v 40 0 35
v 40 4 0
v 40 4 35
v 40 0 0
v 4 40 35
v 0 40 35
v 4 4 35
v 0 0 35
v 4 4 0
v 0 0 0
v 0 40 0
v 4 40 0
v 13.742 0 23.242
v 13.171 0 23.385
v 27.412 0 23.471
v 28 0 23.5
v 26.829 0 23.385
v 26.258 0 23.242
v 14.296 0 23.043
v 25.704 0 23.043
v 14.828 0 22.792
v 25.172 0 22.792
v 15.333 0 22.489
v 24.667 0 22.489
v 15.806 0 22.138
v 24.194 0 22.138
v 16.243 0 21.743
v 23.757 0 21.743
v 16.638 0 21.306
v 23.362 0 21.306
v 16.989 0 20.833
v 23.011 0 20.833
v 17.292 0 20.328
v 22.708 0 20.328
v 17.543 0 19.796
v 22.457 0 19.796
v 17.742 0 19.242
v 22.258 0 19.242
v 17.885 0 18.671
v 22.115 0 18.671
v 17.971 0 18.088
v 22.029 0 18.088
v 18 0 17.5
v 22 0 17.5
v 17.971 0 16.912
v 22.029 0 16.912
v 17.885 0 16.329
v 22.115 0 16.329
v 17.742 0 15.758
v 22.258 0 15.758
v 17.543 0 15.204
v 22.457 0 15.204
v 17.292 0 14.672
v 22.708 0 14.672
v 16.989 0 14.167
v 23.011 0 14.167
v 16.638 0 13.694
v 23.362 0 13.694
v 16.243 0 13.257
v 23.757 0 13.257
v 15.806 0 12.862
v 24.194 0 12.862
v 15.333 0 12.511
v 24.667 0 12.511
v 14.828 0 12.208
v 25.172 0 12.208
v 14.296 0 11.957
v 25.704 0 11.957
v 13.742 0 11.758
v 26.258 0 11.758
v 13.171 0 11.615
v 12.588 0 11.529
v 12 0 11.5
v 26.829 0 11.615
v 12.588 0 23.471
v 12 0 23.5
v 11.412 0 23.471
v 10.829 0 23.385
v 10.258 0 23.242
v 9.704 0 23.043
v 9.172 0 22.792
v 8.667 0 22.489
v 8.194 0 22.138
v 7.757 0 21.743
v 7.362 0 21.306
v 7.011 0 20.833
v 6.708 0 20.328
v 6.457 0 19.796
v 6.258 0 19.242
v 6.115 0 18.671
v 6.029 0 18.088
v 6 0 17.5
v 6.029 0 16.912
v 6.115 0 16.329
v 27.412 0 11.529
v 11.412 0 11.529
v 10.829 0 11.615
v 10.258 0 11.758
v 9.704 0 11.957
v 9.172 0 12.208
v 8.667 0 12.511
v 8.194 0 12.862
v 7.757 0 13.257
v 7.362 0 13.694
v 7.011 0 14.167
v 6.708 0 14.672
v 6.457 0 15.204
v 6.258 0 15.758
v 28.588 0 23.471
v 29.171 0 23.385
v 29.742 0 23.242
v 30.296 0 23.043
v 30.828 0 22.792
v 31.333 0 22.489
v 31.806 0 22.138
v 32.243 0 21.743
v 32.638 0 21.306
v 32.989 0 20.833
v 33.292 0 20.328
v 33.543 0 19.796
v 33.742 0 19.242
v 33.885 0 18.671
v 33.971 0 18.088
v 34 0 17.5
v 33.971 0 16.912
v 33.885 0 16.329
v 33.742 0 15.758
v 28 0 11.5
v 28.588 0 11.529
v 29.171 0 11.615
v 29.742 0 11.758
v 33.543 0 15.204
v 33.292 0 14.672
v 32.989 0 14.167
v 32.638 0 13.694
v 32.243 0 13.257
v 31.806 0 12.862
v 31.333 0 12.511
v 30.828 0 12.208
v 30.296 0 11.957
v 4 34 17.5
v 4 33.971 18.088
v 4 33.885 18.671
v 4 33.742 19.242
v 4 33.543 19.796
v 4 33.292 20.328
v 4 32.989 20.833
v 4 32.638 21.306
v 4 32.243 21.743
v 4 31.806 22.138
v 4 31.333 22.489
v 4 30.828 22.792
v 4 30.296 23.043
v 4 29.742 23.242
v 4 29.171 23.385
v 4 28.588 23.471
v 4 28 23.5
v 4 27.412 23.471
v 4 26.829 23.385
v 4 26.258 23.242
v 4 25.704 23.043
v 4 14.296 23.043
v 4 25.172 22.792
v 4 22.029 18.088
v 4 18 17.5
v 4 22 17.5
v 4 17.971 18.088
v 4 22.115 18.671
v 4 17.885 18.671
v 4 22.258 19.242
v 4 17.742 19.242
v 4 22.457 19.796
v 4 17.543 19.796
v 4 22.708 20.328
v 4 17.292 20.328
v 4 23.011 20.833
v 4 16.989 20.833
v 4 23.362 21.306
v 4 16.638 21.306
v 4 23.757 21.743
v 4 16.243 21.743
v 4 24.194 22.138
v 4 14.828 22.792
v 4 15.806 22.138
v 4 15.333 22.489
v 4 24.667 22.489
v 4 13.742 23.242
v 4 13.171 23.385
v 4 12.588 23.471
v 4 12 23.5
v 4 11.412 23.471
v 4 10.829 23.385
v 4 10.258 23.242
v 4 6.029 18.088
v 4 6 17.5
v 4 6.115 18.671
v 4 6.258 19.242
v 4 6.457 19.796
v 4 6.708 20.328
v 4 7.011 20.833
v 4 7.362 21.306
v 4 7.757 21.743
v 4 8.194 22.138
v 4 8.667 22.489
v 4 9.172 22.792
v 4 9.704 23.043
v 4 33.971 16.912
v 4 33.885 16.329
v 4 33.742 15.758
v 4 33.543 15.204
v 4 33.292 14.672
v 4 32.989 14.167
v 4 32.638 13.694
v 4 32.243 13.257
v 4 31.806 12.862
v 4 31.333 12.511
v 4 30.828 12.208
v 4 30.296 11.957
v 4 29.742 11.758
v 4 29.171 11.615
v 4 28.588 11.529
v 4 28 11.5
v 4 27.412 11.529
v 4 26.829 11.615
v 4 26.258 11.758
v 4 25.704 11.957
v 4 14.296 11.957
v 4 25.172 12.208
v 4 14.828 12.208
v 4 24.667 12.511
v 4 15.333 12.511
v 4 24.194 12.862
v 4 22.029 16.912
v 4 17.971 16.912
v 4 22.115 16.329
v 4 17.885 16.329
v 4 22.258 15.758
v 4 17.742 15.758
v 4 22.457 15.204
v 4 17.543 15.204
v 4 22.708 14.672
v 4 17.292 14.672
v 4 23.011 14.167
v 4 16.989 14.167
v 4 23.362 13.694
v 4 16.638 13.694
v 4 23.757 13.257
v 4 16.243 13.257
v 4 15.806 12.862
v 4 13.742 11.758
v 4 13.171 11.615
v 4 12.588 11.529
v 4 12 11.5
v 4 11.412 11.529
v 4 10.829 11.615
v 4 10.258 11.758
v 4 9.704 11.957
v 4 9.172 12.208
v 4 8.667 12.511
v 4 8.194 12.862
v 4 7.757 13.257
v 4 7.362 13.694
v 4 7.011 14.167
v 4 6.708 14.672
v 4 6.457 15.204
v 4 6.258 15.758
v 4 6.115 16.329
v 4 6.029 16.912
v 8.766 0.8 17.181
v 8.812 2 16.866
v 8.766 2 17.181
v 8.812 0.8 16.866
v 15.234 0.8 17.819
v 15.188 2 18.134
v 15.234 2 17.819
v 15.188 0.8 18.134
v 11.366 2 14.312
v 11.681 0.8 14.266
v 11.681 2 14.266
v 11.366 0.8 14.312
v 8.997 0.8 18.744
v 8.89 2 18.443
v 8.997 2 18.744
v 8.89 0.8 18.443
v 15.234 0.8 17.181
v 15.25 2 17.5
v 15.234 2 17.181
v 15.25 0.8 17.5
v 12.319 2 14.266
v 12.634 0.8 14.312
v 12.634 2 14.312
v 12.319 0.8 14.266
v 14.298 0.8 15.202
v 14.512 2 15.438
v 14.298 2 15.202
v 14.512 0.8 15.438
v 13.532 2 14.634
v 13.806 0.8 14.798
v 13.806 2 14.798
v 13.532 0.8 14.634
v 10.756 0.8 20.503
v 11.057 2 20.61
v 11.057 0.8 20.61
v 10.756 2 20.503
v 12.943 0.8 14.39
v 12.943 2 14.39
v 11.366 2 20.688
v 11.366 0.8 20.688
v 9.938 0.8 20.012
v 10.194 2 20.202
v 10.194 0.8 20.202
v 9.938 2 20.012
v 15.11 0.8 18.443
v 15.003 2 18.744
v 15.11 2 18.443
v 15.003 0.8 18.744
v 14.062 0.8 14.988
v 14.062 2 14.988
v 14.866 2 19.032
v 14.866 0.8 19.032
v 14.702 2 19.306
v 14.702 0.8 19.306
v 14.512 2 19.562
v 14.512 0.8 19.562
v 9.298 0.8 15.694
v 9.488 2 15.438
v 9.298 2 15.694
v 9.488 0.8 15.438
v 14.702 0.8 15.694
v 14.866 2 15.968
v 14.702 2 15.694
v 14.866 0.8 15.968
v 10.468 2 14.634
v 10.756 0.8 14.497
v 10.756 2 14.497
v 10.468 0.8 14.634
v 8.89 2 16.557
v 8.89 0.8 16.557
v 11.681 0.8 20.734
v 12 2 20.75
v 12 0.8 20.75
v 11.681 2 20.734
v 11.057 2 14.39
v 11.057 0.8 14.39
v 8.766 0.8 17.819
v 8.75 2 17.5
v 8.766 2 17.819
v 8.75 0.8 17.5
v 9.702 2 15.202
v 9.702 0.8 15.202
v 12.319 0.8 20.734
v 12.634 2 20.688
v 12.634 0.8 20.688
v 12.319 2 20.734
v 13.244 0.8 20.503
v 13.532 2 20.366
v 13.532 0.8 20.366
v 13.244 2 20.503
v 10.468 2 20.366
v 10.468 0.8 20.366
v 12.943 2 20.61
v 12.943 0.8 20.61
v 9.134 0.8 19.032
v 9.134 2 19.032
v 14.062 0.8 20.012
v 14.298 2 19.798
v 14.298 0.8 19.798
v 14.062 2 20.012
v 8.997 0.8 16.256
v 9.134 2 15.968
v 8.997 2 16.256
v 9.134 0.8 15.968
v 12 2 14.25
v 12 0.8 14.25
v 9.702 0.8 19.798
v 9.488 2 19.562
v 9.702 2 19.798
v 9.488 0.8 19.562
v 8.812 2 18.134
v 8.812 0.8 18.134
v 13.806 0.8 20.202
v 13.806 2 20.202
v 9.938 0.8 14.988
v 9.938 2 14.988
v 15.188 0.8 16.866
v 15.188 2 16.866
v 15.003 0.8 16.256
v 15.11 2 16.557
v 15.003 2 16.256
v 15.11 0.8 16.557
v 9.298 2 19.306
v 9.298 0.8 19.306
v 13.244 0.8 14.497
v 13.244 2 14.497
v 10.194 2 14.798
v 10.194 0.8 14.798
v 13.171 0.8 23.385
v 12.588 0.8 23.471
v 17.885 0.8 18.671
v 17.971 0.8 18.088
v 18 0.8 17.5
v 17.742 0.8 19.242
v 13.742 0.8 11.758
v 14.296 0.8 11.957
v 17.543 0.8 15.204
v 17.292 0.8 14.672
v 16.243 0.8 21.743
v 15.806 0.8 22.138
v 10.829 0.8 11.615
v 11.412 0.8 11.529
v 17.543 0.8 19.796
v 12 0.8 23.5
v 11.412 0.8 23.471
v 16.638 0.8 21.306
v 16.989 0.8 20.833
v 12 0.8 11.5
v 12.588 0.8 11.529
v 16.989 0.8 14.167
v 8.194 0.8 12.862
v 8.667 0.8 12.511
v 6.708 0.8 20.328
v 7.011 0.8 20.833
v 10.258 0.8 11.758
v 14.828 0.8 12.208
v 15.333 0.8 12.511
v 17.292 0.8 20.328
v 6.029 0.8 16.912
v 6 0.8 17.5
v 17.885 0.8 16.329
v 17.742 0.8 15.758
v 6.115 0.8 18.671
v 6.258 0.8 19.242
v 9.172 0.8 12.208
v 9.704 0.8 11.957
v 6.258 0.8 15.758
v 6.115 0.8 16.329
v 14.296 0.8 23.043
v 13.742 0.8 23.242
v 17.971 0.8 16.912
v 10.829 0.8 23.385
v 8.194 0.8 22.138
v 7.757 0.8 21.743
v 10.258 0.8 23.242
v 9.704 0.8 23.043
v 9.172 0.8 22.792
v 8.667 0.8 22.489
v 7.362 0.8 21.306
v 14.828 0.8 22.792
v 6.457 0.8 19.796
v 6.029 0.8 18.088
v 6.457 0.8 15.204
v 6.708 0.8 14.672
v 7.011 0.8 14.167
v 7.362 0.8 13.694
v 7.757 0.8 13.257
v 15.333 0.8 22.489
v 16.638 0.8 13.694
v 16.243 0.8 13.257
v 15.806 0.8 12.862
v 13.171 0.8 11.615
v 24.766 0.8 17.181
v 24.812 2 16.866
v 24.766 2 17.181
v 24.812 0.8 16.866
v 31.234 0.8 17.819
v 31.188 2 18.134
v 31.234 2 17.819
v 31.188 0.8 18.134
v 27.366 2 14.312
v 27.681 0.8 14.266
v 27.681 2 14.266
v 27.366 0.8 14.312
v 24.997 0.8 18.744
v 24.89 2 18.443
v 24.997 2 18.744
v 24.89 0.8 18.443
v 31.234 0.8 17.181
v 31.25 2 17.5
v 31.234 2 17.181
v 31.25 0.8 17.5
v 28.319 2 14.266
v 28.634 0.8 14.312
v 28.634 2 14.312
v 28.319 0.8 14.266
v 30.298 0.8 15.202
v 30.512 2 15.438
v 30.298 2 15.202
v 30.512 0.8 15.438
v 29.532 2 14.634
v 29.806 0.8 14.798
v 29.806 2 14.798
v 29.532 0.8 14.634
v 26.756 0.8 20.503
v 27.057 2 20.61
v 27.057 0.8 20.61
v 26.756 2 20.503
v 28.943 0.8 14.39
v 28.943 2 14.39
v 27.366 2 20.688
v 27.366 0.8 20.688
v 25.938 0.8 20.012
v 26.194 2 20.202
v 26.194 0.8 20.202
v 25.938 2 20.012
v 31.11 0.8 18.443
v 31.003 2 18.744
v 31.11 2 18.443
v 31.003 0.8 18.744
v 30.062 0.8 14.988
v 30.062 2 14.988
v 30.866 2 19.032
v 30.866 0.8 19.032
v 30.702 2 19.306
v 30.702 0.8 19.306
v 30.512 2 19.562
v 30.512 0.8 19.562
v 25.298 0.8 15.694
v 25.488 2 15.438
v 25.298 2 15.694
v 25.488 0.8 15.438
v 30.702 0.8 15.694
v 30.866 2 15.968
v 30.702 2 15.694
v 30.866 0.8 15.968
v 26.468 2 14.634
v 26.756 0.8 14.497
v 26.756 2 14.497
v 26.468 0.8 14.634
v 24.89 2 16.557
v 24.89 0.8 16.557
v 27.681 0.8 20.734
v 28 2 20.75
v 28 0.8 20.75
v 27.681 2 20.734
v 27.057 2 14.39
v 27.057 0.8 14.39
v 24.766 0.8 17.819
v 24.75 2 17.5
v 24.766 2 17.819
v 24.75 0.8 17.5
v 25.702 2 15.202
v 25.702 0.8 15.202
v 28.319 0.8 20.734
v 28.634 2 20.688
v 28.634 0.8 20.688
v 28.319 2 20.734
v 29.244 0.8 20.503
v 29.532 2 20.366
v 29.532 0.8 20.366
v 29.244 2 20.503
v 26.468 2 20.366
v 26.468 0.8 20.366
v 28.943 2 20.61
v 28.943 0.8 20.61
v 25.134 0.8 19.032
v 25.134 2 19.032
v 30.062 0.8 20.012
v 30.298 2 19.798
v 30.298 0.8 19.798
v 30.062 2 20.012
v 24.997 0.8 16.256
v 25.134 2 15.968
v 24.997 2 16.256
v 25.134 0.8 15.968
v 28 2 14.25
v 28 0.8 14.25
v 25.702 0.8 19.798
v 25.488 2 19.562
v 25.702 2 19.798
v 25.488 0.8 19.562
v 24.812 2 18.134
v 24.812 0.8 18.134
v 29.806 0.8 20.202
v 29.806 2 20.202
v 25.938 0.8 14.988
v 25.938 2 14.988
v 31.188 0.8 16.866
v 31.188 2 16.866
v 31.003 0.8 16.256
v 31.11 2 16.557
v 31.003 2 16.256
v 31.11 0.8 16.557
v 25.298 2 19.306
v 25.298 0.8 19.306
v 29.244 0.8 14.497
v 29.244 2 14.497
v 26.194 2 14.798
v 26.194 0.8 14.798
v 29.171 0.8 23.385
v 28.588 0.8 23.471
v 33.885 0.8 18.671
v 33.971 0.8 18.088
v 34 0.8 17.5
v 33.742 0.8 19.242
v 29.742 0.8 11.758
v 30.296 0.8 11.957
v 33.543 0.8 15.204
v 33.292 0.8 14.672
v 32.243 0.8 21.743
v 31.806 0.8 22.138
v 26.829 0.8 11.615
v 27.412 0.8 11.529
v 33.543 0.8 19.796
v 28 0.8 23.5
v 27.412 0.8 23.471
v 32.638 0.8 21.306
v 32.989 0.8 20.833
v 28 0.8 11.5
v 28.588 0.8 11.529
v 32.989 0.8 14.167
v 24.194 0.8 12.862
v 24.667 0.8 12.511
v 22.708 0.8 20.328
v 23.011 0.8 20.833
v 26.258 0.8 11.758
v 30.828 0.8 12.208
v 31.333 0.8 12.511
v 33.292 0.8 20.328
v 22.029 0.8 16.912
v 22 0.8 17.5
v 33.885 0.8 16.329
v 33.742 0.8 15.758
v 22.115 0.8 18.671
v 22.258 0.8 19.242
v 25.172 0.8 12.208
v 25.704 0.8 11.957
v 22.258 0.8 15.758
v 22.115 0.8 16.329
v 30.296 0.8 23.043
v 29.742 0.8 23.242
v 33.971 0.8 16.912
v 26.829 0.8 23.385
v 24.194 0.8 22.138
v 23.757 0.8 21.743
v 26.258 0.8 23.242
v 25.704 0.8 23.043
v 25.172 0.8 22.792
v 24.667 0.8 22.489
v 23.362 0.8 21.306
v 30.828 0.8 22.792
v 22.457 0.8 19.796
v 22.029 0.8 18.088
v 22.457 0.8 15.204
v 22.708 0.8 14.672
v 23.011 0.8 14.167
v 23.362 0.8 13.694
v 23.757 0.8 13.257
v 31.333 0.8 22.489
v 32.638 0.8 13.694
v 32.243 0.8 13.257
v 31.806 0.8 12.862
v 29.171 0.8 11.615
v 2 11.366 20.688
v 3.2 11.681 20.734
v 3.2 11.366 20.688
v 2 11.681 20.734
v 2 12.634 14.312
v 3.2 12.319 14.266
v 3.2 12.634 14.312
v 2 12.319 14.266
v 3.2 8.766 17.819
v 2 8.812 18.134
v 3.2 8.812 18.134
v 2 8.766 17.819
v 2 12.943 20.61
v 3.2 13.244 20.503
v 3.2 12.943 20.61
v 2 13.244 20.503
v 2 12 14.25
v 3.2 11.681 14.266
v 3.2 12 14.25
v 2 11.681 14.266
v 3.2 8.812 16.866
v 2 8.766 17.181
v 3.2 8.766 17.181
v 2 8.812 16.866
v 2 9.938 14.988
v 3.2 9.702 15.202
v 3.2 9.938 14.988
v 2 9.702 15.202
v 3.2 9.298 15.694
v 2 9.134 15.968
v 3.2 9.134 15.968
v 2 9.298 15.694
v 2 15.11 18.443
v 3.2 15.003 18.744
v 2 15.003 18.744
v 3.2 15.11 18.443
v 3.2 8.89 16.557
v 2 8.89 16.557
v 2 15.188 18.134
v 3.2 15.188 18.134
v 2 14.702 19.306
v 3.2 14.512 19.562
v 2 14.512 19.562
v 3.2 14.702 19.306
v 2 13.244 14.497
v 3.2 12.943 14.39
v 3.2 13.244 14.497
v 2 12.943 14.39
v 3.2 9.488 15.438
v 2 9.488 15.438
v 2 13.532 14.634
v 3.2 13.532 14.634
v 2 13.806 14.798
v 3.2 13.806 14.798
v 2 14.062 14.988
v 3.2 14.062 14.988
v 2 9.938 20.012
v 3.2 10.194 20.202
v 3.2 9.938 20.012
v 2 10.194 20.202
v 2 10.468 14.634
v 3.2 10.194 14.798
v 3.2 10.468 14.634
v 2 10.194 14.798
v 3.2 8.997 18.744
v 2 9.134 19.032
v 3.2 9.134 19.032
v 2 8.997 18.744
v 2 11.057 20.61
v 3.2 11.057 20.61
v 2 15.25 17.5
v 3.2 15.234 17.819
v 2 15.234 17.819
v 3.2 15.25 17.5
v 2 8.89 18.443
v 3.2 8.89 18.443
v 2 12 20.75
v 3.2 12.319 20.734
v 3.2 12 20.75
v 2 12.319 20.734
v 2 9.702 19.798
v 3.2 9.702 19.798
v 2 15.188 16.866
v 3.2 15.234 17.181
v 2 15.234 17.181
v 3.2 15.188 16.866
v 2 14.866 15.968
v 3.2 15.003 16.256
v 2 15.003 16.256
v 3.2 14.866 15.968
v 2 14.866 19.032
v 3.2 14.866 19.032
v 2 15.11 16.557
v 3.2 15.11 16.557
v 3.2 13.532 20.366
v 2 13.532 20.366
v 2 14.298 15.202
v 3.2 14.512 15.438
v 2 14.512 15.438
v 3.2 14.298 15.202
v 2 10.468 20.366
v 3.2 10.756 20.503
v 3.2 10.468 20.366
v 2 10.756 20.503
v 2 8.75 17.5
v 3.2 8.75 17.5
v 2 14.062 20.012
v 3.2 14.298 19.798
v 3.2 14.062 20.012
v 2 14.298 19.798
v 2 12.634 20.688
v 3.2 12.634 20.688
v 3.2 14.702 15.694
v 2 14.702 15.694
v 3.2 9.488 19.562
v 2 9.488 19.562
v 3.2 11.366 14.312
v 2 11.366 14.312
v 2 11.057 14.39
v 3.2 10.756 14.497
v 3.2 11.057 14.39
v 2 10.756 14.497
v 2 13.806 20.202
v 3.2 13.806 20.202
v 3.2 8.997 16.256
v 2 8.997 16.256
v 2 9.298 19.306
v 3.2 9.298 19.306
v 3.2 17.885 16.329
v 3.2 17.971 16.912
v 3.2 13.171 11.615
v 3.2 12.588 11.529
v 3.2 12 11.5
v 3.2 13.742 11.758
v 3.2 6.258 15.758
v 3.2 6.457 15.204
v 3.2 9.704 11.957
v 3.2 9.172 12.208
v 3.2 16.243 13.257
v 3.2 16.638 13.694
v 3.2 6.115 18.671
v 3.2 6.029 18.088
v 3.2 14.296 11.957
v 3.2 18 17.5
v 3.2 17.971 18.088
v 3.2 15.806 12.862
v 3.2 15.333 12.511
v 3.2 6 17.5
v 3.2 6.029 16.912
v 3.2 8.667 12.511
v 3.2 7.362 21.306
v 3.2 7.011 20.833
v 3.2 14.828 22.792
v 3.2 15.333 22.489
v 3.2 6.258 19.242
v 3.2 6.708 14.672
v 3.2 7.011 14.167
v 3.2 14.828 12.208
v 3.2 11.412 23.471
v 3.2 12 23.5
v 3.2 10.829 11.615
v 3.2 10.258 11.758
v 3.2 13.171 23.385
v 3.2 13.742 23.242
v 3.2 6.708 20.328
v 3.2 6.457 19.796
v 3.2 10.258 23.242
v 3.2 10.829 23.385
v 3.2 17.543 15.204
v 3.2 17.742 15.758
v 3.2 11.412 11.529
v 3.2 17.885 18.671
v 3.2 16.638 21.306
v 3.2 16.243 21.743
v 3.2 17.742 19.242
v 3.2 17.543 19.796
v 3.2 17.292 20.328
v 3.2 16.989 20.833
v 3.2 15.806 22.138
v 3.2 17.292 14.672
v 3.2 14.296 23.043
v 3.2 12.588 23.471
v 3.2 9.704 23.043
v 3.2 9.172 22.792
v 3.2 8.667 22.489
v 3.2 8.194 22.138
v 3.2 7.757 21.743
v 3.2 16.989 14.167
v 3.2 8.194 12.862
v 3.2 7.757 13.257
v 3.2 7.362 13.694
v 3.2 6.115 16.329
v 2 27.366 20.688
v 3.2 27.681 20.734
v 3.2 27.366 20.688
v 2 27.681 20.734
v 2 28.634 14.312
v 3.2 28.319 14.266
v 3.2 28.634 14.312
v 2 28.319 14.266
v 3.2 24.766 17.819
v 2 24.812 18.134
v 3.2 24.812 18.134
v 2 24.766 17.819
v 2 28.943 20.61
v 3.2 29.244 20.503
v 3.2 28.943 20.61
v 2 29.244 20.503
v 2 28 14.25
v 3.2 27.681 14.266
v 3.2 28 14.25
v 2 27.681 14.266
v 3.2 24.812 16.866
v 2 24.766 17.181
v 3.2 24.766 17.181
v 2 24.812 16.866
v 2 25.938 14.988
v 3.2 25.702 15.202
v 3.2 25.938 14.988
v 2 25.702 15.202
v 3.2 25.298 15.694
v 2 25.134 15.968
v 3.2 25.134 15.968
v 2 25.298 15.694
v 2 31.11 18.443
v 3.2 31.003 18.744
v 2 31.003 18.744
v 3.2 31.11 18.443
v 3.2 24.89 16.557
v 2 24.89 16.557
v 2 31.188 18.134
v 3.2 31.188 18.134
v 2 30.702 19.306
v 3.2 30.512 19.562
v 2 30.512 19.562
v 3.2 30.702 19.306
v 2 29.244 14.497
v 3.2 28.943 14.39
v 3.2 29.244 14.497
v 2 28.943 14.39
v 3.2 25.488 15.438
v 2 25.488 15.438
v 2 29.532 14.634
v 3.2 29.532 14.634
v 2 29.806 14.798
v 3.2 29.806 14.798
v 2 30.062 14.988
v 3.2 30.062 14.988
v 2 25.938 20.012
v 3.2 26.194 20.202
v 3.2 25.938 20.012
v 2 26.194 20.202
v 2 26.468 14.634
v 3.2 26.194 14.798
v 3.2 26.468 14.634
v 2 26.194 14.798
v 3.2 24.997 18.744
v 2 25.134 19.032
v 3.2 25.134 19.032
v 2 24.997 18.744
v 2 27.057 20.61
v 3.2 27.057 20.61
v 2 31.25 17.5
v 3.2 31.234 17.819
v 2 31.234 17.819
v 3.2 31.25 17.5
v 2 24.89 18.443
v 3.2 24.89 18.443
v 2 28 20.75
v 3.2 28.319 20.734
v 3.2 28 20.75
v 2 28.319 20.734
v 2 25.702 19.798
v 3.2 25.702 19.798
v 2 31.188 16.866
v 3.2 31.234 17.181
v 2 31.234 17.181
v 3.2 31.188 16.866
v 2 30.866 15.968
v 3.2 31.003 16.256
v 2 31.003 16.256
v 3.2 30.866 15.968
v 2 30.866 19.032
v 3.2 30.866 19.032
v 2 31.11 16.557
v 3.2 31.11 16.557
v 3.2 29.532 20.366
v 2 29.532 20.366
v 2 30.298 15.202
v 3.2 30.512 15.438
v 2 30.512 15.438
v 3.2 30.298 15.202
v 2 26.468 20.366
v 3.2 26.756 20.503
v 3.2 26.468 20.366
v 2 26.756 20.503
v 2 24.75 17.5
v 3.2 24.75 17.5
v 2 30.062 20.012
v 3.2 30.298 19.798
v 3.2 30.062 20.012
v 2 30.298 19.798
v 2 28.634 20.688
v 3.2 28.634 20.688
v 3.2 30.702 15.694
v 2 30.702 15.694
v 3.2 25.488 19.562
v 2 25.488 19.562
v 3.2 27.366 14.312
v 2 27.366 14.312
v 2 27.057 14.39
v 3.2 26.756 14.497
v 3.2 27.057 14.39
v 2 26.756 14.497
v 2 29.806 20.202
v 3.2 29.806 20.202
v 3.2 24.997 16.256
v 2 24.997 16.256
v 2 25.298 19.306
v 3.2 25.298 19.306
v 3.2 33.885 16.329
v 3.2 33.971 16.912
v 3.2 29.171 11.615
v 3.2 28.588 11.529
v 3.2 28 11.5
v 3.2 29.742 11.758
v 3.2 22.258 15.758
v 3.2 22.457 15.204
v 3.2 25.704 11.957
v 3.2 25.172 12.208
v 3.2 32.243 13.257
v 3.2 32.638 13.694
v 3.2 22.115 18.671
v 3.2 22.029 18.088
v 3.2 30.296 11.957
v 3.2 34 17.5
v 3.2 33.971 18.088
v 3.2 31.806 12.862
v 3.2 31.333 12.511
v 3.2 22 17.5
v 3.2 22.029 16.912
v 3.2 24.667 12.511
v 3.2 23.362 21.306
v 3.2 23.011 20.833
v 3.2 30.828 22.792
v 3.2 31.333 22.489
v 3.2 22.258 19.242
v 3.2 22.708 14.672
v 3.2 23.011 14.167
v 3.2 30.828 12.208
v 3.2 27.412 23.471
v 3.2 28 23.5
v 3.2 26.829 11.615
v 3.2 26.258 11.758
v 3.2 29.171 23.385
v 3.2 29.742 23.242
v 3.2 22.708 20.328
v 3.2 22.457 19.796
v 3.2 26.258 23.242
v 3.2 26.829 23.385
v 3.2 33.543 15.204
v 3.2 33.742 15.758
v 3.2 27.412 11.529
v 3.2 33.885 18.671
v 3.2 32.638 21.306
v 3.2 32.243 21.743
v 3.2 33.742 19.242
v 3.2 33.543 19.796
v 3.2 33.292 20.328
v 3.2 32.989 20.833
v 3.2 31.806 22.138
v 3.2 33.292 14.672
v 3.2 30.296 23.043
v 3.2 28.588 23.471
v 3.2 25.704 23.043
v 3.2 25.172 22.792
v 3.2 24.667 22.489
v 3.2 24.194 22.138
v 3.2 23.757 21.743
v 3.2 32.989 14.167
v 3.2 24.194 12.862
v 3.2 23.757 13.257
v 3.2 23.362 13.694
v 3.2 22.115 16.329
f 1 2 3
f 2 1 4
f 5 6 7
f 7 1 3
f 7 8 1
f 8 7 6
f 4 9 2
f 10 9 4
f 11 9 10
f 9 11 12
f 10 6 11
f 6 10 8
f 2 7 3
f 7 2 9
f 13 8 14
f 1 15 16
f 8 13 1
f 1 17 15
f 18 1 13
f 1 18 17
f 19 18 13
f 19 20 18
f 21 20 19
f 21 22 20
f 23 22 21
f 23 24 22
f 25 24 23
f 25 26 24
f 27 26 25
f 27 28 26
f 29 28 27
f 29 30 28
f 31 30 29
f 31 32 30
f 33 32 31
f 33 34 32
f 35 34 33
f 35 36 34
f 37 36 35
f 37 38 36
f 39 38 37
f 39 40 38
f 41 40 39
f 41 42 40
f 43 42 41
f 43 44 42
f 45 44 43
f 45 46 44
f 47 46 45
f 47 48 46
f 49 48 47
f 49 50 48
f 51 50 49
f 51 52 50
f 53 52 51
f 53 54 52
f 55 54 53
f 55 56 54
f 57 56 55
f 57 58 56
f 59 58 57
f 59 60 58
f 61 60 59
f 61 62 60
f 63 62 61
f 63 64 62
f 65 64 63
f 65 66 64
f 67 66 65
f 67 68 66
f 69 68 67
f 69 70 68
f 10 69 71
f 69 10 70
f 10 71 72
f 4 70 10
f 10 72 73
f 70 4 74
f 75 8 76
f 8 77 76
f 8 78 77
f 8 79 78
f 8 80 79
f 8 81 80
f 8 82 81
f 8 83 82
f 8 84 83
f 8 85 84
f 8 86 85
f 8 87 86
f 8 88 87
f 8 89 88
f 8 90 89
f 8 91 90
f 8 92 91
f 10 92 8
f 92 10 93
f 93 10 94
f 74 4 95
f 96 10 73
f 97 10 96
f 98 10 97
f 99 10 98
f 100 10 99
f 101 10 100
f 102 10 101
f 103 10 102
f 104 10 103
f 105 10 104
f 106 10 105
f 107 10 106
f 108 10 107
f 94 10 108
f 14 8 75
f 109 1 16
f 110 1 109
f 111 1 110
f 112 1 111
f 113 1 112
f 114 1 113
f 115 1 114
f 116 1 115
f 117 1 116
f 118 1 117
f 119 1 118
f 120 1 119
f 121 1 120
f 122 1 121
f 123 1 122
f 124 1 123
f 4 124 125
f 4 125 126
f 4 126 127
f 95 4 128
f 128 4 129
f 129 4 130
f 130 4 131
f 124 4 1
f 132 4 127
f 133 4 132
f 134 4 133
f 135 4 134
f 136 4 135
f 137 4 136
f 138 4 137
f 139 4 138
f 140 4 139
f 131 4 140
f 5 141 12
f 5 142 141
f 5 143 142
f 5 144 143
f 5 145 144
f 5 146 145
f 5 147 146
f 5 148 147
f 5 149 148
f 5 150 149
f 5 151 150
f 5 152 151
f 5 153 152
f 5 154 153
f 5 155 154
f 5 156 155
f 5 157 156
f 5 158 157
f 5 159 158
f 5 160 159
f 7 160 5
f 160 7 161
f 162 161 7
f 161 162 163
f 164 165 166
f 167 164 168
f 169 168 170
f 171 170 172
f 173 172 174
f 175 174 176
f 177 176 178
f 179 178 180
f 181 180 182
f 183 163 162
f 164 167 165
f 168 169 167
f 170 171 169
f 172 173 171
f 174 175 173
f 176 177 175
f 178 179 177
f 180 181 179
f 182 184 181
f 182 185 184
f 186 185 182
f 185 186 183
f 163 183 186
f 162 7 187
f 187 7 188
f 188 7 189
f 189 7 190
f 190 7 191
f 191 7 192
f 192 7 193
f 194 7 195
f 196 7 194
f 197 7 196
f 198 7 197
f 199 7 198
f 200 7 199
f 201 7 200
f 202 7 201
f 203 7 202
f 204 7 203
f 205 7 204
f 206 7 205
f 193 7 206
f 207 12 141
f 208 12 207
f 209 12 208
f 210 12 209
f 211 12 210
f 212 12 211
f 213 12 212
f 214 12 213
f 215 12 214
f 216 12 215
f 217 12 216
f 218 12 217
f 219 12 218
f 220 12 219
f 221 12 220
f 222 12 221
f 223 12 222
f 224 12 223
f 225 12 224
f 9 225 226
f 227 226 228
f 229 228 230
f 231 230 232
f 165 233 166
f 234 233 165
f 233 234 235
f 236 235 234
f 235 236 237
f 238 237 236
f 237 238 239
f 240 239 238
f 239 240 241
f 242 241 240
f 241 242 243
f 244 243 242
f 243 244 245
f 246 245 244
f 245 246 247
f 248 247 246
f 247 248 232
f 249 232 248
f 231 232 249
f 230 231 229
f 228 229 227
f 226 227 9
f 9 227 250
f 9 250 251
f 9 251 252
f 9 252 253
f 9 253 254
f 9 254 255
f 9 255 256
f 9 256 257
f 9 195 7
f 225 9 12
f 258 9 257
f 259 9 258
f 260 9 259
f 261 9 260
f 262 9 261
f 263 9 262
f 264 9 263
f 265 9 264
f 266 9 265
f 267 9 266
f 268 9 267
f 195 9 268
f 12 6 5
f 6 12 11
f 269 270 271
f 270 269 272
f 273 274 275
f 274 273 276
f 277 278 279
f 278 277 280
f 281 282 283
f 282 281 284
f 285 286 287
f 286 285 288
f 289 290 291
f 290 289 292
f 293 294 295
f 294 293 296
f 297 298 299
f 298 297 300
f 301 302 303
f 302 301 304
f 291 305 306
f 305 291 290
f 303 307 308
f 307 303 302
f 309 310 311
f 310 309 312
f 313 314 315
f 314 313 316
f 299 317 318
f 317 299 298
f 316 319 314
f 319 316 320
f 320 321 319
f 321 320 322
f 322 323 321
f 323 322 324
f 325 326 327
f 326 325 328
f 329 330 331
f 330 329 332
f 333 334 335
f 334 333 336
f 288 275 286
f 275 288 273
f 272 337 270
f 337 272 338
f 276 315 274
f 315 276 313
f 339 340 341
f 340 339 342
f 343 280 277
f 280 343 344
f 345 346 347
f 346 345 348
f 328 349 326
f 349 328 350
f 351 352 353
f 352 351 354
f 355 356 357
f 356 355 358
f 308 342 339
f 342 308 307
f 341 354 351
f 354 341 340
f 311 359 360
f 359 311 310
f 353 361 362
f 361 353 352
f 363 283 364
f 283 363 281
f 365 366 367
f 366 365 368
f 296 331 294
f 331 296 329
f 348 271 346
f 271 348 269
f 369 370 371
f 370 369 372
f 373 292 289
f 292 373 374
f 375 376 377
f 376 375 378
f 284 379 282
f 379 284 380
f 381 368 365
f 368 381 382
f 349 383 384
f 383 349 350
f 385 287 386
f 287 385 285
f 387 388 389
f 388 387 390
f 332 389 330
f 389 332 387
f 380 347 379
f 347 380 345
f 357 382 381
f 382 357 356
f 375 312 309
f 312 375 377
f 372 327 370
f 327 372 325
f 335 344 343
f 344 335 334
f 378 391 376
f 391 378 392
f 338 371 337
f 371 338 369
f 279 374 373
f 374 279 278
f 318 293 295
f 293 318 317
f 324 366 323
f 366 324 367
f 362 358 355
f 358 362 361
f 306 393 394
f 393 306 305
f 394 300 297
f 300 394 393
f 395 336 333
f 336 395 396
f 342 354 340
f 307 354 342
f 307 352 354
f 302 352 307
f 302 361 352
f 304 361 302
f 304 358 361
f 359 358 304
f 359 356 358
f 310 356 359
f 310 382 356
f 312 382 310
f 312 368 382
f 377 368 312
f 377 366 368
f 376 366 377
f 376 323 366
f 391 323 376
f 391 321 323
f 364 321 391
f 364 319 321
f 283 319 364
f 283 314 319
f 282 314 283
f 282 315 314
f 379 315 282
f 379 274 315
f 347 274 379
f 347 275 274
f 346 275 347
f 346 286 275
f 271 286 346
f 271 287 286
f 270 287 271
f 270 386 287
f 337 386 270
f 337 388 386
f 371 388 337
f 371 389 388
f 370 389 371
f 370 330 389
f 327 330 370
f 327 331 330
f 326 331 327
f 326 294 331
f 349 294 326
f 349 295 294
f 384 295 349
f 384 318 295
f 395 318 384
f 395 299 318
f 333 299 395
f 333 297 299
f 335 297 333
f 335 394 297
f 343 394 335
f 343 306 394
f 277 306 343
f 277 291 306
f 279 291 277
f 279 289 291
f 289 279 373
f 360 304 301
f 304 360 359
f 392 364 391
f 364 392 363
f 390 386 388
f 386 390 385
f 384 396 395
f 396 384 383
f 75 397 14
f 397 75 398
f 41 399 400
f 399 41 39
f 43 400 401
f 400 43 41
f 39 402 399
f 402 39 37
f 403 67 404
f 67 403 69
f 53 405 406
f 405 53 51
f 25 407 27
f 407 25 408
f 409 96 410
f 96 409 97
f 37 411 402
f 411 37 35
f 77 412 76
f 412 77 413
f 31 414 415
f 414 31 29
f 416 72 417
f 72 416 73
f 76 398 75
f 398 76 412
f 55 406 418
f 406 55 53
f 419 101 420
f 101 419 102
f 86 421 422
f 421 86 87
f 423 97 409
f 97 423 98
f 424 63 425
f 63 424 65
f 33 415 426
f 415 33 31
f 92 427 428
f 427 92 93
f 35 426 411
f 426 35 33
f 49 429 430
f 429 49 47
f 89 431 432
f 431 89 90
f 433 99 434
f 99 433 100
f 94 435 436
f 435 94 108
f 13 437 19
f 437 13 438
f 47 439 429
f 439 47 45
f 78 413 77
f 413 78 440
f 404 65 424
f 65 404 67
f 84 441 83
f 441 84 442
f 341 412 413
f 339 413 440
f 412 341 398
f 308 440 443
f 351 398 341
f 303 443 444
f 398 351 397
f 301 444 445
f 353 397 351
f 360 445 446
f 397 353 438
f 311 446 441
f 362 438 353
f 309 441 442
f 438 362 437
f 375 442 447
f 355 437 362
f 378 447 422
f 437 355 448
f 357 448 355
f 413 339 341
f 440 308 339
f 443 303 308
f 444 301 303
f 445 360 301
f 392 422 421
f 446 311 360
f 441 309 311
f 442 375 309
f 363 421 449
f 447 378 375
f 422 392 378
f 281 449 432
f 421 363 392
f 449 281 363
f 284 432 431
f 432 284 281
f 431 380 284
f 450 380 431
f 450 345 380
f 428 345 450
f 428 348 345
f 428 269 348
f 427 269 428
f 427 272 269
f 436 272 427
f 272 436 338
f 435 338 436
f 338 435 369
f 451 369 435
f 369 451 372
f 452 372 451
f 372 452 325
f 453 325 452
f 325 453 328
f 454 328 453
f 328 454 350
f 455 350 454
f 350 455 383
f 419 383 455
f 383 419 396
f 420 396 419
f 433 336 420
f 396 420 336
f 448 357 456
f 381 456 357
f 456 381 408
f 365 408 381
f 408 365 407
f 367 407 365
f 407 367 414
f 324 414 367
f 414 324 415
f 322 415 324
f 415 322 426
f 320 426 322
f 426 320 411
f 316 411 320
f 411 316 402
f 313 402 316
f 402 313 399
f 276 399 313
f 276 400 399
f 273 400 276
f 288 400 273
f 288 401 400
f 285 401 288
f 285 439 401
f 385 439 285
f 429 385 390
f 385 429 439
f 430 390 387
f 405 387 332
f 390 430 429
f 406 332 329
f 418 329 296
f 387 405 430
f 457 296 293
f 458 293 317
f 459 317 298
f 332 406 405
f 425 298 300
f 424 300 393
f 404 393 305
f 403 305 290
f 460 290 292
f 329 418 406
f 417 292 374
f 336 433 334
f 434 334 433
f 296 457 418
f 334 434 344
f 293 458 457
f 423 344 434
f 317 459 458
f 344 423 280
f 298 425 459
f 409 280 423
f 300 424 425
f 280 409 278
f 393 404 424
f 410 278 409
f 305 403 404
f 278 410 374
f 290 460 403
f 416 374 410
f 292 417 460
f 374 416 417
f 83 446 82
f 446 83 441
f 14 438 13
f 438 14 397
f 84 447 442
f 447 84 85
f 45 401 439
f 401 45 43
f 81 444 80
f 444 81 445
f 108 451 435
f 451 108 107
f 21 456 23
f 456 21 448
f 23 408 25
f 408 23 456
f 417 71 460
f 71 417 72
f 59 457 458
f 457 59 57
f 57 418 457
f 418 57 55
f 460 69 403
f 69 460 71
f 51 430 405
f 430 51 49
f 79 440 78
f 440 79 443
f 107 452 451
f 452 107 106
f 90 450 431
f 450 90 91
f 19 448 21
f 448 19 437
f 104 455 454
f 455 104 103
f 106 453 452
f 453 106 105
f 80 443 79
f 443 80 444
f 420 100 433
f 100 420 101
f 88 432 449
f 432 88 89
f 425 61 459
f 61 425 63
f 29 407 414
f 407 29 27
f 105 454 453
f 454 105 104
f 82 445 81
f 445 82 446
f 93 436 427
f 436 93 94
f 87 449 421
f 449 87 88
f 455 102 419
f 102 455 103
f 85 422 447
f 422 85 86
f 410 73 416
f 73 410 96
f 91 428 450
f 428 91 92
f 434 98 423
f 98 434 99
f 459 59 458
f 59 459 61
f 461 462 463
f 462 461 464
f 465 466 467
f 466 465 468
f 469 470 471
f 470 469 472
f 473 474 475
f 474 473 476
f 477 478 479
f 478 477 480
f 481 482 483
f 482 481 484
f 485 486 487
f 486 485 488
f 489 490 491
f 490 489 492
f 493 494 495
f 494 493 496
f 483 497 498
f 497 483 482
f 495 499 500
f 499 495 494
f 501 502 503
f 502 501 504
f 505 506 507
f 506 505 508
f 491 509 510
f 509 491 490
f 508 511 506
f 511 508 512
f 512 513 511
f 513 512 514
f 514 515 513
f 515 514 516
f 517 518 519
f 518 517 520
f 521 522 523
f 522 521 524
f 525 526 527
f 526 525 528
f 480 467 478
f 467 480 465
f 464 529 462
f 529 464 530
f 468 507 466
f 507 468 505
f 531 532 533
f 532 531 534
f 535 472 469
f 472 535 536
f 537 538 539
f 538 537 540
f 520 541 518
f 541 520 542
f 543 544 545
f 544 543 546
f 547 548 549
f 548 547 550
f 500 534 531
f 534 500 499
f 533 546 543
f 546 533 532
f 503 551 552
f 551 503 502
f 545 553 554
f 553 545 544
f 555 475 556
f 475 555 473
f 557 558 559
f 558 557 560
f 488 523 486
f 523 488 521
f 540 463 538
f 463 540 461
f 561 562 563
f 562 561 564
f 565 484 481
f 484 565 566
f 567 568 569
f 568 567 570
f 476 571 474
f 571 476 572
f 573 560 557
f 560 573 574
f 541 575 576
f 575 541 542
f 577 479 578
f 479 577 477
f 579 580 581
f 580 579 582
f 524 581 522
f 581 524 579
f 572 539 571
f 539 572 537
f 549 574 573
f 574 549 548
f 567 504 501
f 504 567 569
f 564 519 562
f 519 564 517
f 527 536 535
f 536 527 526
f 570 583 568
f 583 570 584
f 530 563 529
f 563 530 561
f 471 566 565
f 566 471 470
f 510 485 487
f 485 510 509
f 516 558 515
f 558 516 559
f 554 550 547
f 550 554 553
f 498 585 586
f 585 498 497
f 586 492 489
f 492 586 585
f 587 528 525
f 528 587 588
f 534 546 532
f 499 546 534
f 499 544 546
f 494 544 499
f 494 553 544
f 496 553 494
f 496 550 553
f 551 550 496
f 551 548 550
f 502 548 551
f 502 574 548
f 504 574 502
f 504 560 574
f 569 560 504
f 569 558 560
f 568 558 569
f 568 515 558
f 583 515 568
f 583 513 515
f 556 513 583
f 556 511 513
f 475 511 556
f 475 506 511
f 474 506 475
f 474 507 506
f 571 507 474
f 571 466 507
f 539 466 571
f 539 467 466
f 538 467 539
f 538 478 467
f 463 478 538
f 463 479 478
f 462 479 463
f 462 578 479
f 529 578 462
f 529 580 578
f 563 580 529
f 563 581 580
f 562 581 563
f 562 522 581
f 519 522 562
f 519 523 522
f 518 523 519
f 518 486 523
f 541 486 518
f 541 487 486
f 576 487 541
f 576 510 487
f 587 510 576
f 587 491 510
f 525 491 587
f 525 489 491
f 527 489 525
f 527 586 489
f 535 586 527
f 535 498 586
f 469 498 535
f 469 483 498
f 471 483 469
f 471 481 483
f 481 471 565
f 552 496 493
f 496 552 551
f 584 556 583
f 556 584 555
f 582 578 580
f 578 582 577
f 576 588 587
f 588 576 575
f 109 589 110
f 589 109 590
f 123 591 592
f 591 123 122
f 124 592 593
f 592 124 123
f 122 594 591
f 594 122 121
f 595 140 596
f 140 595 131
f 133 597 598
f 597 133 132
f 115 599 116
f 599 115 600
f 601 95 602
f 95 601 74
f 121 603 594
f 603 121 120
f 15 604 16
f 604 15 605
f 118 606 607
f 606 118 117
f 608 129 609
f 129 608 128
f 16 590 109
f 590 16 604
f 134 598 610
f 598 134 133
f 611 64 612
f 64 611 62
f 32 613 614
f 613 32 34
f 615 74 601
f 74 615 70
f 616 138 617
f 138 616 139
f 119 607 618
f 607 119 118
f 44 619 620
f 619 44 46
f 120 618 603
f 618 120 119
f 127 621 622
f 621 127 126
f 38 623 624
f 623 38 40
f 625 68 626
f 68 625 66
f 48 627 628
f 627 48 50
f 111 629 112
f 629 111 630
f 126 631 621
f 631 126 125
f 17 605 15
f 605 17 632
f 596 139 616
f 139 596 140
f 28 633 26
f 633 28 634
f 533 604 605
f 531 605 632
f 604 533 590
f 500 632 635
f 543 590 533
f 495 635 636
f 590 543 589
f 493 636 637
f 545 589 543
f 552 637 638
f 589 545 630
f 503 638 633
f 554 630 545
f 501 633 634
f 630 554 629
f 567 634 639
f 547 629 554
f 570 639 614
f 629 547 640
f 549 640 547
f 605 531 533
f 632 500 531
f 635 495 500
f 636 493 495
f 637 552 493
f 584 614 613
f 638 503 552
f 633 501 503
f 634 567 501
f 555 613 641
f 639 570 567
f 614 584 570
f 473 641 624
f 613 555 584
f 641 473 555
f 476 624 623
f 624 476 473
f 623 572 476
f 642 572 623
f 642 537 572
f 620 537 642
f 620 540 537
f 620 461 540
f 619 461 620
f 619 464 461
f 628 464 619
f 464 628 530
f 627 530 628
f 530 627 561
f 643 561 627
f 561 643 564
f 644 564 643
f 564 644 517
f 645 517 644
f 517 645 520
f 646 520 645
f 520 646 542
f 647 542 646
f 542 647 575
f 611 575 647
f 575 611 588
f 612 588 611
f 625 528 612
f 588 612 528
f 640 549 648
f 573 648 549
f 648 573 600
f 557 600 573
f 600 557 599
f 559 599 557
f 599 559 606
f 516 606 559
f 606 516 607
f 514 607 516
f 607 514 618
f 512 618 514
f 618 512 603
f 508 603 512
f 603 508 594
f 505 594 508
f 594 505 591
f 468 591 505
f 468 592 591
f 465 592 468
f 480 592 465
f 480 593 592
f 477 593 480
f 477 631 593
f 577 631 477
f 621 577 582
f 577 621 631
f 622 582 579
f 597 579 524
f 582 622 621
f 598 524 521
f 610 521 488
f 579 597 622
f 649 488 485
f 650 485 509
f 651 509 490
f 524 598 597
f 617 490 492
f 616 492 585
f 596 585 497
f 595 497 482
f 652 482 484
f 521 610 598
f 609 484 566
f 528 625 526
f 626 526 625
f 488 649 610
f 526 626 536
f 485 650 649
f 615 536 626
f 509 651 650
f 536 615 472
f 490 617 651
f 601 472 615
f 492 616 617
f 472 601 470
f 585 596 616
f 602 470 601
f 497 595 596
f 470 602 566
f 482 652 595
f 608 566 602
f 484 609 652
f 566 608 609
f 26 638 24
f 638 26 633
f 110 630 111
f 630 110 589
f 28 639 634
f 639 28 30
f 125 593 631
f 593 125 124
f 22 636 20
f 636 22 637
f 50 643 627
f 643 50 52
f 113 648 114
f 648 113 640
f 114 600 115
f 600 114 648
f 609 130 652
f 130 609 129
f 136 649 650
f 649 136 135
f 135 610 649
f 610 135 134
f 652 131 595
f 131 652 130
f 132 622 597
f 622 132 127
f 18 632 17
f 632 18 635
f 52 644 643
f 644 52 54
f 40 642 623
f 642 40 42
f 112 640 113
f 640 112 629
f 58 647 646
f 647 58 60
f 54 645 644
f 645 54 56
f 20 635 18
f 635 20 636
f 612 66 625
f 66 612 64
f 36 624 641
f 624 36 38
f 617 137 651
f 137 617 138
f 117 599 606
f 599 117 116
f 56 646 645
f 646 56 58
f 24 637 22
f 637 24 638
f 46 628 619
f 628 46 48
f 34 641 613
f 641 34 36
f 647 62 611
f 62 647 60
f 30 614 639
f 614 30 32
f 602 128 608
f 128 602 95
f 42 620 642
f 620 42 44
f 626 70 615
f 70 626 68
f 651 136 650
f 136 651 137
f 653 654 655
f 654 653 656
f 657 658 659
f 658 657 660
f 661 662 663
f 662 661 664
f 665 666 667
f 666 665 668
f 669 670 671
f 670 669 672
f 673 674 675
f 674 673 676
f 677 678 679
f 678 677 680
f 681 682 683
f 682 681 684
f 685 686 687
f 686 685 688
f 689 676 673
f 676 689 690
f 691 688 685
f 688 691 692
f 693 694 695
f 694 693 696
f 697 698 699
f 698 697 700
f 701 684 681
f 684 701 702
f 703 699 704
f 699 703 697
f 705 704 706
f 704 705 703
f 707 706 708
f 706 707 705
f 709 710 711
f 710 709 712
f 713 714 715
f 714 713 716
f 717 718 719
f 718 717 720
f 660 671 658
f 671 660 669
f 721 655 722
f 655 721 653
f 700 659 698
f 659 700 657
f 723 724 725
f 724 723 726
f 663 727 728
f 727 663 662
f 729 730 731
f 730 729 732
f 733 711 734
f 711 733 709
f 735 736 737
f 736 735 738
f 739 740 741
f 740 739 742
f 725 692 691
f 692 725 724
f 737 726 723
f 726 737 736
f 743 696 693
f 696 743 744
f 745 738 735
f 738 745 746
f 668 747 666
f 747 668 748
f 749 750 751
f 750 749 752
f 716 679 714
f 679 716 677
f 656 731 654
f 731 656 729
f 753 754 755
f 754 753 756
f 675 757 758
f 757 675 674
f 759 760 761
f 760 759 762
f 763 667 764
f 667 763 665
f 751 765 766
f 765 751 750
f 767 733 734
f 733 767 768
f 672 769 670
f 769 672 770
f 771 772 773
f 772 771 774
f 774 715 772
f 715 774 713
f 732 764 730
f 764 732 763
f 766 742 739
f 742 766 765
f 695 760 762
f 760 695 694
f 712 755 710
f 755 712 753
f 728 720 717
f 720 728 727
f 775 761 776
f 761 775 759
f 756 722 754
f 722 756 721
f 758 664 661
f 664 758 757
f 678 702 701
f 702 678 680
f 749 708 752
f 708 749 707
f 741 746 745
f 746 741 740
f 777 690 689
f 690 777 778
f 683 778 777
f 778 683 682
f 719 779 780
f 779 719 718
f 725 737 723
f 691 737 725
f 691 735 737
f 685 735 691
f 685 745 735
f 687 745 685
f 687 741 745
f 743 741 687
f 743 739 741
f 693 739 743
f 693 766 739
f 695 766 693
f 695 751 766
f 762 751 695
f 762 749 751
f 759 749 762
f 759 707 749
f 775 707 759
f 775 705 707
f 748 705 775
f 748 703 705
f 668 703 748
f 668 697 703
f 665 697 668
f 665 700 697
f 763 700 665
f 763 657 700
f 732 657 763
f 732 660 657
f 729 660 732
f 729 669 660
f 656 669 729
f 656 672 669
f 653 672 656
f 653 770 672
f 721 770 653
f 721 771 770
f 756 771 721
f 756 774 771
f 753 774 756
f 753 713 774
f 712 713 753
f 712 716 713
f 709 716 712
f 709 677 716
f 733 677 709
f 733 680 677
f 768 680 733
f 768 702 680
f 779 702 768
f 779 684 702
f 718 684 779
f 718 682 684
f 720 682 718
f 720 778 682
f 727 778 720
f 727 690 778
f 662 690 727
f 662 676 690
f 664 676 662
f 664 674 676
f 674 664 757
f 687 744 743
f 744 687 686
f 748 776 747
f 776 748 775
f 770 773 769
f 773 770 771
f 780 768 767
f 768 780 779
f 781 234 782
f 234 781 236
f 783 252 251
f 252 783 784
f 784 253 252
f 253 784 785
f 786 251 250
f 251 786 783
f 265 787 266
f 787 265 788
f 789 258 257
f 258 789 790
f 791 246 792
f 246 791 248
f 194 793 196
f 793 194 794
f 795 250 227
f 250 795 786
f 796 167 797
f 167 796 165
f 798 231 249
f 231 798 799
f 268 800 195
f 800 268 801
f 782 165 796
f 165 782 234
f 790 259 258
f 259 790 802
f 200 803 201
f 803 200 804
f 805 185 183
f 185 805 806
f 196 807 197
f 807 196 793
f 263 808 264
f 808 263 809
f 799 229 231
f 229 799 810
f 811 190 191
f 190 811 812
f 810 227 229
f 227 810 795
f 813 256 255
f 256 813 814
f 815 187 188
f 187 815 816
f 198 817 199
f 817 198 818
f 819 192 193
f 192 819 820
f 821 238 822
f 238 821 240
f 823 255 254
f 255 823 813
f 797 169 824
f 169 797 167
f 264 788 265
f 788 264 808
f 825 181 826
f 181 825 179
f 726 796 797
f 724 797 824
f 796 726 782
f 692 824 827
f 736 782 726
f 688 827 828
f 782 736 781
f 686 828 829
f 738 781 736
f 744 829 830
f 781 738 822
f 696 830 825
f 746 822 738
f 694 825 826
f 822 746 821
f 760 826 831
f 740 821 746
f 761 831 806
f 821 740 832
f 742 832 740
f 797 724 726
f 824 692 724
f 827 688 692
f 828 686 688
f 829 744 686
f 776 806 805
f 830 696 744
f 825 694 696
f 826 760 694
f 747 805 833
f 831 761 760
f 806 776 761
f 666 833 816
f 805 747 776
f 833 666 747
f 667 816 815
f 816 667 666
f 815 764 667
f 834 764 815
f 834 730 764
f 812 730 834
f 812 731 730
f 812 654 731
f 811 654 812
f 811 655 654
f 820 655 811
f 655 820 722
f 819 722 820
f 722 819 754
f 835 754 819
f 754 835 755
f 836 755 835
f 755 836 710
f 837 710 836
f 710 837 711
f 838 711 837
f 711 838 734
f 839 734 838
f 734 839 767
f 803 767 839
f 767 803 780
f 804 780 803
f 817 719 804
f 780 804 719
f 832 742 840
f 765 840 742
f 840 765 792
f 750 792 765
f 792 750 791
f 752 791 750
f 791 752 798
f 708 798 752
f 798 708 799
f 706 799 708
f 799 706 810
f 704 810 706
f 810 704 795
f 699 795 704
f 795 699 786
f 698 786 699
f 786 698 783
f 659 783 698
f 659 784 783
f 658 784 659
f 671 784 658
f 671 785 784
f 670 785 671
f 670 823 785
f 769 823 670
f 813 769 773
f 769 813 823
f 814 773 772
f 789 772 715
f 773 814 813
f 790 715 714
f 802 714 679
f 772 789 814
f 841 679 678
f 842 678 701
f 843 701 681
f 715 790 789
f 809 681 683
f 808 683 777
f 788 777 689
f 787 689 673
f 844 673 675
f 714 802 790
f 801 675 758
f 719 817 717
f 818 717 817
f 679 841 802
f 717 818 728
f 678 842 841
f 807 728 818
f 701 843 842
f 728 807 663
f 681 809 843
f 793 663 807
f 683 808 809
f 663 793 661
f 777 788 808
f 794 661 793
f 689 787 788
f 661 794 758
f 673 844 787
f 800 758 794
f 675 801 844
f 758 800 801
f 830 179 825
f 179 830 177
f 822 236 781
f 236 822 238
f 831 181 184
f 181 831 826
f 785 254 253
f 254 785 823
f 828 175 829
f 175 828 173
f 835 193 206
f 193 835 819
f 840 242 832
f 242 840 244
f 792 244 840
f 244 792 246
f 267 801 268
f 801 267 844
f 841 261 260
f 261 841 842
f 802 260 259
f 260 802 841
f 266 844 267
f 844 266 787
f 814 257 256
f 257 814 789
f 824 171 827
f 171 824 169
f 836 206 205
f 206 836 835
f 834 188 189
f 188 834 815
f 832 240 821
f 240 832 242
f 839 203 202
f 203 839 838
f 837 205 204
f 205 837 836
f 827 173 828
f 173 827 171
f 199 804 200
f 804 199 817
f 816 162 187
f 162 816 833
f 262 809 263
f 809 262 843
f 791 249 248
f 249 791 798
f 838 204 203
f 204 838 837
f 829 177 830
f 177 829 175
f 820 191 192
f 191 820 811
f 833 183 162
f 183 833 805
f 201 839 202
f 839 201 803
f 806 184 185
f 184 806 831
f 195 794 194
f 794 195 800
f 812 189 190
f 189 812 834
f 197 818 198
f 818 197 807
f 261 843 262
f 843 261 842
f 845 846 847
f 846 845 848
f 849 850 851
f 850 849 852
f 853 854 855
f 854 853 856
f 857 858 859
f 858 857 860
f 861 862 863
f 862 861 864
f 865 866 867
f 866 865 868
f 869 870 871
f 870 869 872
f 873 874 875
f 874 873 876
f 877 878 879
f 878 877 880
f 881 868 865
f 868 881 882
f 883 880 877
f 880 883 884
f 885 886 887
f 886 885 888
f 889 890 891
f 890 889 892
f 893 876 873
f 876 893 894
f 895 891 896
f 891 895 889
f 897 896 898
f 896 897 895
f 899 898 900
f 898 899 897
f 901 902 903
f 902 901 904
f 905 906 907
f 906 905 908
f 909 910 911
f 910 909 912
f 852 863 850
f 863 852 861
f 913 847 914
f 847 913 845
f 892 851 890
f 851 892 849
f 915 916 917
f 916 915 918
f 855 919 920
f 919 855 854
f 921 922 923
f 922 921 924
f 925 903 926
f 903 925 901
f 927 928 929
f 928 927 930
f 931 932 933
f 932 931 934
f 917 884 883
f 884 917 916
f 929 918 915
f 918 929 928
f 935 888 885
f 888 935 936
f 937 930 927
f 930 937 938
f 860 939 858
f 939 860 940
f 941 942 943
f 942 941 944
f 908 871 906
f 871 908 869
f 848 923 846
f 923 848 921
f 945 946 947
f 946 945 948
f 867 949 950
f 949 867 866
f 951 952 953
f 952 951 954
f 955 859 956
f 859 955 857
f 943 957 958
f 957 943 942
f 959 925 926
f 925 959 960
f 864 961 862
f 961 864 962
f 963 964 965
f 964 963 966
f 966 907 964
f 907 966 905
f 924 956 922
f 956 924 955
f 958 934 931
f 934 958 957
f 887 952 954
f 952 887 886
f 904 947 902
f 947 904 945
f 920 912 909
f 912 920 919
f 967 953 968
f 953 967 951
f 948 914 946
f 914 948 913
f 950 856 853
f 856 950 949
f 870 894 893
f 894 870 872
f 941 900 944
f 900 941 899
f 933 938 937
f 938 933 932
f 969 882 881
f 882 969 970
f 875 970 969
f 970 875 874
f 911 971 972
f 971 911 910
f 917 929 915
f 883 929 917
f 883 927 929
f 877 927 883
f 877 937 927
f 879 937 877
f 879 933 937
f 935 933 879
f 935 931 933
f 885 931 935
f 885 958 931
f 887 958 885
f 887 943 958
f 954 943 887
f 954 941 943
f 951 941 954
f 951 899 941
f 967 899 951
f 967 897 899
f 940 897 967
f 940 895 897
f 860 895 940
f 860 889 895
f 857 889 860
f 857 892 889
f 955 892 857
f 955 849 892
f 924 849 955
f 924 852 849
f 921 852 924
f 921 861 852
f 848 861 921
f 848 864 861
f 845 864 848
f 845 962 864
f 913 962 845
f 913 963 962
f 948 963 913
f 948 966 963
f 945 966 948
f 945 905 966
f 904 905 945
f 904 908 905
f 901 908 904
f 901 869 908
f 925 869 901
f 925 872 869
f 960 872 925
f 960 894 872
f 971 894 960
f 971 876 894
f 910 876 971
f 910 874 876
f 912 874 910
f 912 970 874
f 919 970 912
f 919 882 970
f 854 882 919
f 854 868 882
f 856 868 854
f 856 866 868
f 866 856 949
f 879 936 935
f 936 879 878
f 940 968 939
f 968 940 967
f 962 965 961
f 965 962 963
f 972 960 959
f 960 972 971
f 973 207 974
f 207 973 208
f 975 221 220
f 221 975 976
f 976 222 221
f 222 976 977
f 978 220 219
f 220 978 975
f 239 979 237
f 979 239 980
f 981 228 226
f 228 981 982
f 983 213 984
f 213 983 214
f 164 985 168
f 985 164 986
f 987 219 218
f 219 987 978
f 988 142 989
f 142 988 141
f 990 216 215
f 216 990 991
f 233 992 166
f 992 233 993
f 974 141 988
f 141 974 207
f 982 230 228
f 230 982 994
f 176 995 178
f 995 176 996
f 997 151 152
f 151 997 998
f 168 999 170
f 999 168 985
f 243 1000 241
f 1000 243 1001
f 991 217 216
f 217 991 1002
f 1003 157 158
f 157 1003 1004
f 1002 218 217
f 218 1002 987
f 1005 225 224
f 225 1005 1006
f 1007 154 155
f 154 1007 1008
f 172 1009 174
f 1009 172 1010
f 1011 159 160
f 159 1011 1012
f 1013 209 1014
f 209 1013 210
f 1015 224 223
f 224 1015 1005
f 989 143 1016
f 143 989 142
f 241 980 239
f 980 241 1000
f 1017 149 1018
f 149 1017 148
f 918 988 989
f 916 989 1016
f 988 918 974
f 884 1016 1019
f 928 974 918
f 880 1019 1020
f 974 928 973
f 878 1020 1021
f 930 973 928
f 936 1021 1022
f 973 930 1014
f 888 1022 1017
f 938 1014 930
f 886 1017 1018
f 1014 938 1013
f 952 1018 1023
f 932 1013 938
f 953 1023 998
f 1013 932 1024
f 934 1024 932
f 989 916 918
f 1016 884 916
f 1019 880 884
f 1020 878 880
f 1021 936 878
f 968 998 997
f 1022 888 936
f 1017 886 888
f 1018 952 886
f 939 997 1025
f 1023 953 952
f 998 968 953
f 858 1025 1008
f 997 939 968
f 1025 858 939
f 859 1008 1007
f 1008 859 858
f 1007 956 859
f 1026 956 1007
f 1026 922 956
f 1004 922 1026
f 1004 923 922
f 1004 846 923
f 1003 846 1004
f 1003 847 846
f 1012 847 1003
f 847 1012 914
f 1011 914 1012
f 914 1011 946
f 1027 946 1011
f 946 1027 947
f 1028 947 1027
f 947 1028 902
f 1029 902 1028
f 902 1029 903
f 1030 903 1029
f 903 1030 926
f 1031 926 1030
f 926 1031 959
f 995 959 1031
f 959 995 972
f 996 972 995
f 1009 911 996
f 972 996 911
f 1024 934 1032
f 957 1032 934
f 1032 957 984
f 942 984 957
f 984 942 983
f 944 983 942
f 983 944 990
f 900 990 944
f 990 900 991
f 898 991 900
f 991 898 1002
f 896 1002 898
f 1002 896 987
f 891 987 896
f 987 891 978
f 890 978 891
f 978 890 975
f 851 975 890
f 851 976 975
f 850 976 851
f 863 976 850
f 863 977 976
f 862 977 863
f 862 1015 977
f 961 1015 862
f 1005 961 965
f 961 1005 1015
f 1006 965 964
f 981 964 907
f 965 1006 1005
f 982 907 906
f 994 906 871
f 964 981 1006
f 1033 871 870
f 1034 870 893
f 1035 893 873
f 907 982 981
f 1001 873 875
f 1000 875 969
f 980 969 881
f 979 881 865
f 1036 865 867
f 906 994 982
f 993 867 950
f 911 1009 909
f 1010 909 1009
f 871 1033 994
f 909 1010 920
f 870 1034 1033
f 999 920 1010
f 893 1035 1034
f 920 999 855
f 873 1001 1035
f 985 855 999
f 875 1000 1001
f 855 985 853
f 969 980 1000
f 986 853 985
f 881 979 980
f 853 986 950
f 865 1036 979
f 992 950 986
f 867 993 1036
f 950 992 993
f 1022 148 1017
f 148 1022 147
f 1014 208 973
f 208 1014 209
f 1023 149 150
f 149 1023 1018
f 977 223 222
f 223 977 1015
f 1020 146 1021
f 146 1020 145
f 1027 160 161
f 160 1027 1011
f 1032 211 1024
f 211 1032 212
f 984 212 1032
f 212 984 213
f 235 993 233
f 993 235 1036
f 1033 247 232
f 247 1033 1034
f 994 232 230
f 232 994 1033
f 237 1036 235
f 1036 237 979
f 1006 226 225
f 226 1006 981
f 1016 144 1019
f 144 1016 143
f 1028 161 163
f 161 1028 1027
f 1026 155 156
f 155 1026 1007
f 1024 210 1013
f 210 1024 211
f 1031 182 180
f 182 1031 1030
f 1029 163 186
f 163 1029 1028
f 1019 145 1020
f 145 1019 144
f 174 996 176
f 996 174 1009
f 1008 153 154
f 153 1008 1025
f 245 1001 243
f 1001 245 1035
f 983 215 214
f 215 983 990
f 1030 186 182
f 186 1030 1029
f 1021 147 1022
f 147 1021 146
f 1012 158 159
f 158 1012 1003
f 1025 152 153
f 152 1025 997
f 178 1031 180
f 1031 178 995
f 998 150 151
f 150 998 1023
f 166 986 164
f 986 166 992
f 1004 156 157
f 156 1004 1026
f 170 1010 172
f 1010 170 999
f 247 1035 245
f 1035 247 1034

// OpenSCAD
$fn=64;

size = [40,40,35];   // overall bounding box
wall = 4;            // bracket wall thickness
hole_d = 6.5;        // clearance for M6
csk_d = 12;          // counterbore diameter
csk_h = 3;           // counterbore depth
edge_off = 12;       // hole offset from outer edges

module counterbore_hole(h=20){
    union(){
        cylinder(d=hole_d, h=h);
        translate([0,0,h-csk_h]) cylinder(d=csk_d, h=csk_h);
    }
}

difference(){
    // L-bracket body (two plates)
    union(){
        cube([size[0], wall, size[2]], center=false); // base plate along X
        cube([wall, size[1], size[2]], center=false); // base plate along Y
    }

    // lighten inside corner (optional relief)
    translate([wall, wall, 0])
        cube([size[0]-wall, size[1]-wall, size[2]], center=false);

    // holes on X plate (through Y thickness)
    for (xpos = [edge_off, size[0]-edge_off])
        translate([xpos, wall/2, size[2]/2])
            rotate([90,0,0])
                counterbore_hole(h=wall+0.2);

    // holes on Y plate (through X thickness)
    for (ypos = [edge_off, size[1]-edge_off])
        translate([wall/2, ypos, size[2]/2])
            rotate([0,90,0])
                counterbore_hole(h=wall+0.2);
}
